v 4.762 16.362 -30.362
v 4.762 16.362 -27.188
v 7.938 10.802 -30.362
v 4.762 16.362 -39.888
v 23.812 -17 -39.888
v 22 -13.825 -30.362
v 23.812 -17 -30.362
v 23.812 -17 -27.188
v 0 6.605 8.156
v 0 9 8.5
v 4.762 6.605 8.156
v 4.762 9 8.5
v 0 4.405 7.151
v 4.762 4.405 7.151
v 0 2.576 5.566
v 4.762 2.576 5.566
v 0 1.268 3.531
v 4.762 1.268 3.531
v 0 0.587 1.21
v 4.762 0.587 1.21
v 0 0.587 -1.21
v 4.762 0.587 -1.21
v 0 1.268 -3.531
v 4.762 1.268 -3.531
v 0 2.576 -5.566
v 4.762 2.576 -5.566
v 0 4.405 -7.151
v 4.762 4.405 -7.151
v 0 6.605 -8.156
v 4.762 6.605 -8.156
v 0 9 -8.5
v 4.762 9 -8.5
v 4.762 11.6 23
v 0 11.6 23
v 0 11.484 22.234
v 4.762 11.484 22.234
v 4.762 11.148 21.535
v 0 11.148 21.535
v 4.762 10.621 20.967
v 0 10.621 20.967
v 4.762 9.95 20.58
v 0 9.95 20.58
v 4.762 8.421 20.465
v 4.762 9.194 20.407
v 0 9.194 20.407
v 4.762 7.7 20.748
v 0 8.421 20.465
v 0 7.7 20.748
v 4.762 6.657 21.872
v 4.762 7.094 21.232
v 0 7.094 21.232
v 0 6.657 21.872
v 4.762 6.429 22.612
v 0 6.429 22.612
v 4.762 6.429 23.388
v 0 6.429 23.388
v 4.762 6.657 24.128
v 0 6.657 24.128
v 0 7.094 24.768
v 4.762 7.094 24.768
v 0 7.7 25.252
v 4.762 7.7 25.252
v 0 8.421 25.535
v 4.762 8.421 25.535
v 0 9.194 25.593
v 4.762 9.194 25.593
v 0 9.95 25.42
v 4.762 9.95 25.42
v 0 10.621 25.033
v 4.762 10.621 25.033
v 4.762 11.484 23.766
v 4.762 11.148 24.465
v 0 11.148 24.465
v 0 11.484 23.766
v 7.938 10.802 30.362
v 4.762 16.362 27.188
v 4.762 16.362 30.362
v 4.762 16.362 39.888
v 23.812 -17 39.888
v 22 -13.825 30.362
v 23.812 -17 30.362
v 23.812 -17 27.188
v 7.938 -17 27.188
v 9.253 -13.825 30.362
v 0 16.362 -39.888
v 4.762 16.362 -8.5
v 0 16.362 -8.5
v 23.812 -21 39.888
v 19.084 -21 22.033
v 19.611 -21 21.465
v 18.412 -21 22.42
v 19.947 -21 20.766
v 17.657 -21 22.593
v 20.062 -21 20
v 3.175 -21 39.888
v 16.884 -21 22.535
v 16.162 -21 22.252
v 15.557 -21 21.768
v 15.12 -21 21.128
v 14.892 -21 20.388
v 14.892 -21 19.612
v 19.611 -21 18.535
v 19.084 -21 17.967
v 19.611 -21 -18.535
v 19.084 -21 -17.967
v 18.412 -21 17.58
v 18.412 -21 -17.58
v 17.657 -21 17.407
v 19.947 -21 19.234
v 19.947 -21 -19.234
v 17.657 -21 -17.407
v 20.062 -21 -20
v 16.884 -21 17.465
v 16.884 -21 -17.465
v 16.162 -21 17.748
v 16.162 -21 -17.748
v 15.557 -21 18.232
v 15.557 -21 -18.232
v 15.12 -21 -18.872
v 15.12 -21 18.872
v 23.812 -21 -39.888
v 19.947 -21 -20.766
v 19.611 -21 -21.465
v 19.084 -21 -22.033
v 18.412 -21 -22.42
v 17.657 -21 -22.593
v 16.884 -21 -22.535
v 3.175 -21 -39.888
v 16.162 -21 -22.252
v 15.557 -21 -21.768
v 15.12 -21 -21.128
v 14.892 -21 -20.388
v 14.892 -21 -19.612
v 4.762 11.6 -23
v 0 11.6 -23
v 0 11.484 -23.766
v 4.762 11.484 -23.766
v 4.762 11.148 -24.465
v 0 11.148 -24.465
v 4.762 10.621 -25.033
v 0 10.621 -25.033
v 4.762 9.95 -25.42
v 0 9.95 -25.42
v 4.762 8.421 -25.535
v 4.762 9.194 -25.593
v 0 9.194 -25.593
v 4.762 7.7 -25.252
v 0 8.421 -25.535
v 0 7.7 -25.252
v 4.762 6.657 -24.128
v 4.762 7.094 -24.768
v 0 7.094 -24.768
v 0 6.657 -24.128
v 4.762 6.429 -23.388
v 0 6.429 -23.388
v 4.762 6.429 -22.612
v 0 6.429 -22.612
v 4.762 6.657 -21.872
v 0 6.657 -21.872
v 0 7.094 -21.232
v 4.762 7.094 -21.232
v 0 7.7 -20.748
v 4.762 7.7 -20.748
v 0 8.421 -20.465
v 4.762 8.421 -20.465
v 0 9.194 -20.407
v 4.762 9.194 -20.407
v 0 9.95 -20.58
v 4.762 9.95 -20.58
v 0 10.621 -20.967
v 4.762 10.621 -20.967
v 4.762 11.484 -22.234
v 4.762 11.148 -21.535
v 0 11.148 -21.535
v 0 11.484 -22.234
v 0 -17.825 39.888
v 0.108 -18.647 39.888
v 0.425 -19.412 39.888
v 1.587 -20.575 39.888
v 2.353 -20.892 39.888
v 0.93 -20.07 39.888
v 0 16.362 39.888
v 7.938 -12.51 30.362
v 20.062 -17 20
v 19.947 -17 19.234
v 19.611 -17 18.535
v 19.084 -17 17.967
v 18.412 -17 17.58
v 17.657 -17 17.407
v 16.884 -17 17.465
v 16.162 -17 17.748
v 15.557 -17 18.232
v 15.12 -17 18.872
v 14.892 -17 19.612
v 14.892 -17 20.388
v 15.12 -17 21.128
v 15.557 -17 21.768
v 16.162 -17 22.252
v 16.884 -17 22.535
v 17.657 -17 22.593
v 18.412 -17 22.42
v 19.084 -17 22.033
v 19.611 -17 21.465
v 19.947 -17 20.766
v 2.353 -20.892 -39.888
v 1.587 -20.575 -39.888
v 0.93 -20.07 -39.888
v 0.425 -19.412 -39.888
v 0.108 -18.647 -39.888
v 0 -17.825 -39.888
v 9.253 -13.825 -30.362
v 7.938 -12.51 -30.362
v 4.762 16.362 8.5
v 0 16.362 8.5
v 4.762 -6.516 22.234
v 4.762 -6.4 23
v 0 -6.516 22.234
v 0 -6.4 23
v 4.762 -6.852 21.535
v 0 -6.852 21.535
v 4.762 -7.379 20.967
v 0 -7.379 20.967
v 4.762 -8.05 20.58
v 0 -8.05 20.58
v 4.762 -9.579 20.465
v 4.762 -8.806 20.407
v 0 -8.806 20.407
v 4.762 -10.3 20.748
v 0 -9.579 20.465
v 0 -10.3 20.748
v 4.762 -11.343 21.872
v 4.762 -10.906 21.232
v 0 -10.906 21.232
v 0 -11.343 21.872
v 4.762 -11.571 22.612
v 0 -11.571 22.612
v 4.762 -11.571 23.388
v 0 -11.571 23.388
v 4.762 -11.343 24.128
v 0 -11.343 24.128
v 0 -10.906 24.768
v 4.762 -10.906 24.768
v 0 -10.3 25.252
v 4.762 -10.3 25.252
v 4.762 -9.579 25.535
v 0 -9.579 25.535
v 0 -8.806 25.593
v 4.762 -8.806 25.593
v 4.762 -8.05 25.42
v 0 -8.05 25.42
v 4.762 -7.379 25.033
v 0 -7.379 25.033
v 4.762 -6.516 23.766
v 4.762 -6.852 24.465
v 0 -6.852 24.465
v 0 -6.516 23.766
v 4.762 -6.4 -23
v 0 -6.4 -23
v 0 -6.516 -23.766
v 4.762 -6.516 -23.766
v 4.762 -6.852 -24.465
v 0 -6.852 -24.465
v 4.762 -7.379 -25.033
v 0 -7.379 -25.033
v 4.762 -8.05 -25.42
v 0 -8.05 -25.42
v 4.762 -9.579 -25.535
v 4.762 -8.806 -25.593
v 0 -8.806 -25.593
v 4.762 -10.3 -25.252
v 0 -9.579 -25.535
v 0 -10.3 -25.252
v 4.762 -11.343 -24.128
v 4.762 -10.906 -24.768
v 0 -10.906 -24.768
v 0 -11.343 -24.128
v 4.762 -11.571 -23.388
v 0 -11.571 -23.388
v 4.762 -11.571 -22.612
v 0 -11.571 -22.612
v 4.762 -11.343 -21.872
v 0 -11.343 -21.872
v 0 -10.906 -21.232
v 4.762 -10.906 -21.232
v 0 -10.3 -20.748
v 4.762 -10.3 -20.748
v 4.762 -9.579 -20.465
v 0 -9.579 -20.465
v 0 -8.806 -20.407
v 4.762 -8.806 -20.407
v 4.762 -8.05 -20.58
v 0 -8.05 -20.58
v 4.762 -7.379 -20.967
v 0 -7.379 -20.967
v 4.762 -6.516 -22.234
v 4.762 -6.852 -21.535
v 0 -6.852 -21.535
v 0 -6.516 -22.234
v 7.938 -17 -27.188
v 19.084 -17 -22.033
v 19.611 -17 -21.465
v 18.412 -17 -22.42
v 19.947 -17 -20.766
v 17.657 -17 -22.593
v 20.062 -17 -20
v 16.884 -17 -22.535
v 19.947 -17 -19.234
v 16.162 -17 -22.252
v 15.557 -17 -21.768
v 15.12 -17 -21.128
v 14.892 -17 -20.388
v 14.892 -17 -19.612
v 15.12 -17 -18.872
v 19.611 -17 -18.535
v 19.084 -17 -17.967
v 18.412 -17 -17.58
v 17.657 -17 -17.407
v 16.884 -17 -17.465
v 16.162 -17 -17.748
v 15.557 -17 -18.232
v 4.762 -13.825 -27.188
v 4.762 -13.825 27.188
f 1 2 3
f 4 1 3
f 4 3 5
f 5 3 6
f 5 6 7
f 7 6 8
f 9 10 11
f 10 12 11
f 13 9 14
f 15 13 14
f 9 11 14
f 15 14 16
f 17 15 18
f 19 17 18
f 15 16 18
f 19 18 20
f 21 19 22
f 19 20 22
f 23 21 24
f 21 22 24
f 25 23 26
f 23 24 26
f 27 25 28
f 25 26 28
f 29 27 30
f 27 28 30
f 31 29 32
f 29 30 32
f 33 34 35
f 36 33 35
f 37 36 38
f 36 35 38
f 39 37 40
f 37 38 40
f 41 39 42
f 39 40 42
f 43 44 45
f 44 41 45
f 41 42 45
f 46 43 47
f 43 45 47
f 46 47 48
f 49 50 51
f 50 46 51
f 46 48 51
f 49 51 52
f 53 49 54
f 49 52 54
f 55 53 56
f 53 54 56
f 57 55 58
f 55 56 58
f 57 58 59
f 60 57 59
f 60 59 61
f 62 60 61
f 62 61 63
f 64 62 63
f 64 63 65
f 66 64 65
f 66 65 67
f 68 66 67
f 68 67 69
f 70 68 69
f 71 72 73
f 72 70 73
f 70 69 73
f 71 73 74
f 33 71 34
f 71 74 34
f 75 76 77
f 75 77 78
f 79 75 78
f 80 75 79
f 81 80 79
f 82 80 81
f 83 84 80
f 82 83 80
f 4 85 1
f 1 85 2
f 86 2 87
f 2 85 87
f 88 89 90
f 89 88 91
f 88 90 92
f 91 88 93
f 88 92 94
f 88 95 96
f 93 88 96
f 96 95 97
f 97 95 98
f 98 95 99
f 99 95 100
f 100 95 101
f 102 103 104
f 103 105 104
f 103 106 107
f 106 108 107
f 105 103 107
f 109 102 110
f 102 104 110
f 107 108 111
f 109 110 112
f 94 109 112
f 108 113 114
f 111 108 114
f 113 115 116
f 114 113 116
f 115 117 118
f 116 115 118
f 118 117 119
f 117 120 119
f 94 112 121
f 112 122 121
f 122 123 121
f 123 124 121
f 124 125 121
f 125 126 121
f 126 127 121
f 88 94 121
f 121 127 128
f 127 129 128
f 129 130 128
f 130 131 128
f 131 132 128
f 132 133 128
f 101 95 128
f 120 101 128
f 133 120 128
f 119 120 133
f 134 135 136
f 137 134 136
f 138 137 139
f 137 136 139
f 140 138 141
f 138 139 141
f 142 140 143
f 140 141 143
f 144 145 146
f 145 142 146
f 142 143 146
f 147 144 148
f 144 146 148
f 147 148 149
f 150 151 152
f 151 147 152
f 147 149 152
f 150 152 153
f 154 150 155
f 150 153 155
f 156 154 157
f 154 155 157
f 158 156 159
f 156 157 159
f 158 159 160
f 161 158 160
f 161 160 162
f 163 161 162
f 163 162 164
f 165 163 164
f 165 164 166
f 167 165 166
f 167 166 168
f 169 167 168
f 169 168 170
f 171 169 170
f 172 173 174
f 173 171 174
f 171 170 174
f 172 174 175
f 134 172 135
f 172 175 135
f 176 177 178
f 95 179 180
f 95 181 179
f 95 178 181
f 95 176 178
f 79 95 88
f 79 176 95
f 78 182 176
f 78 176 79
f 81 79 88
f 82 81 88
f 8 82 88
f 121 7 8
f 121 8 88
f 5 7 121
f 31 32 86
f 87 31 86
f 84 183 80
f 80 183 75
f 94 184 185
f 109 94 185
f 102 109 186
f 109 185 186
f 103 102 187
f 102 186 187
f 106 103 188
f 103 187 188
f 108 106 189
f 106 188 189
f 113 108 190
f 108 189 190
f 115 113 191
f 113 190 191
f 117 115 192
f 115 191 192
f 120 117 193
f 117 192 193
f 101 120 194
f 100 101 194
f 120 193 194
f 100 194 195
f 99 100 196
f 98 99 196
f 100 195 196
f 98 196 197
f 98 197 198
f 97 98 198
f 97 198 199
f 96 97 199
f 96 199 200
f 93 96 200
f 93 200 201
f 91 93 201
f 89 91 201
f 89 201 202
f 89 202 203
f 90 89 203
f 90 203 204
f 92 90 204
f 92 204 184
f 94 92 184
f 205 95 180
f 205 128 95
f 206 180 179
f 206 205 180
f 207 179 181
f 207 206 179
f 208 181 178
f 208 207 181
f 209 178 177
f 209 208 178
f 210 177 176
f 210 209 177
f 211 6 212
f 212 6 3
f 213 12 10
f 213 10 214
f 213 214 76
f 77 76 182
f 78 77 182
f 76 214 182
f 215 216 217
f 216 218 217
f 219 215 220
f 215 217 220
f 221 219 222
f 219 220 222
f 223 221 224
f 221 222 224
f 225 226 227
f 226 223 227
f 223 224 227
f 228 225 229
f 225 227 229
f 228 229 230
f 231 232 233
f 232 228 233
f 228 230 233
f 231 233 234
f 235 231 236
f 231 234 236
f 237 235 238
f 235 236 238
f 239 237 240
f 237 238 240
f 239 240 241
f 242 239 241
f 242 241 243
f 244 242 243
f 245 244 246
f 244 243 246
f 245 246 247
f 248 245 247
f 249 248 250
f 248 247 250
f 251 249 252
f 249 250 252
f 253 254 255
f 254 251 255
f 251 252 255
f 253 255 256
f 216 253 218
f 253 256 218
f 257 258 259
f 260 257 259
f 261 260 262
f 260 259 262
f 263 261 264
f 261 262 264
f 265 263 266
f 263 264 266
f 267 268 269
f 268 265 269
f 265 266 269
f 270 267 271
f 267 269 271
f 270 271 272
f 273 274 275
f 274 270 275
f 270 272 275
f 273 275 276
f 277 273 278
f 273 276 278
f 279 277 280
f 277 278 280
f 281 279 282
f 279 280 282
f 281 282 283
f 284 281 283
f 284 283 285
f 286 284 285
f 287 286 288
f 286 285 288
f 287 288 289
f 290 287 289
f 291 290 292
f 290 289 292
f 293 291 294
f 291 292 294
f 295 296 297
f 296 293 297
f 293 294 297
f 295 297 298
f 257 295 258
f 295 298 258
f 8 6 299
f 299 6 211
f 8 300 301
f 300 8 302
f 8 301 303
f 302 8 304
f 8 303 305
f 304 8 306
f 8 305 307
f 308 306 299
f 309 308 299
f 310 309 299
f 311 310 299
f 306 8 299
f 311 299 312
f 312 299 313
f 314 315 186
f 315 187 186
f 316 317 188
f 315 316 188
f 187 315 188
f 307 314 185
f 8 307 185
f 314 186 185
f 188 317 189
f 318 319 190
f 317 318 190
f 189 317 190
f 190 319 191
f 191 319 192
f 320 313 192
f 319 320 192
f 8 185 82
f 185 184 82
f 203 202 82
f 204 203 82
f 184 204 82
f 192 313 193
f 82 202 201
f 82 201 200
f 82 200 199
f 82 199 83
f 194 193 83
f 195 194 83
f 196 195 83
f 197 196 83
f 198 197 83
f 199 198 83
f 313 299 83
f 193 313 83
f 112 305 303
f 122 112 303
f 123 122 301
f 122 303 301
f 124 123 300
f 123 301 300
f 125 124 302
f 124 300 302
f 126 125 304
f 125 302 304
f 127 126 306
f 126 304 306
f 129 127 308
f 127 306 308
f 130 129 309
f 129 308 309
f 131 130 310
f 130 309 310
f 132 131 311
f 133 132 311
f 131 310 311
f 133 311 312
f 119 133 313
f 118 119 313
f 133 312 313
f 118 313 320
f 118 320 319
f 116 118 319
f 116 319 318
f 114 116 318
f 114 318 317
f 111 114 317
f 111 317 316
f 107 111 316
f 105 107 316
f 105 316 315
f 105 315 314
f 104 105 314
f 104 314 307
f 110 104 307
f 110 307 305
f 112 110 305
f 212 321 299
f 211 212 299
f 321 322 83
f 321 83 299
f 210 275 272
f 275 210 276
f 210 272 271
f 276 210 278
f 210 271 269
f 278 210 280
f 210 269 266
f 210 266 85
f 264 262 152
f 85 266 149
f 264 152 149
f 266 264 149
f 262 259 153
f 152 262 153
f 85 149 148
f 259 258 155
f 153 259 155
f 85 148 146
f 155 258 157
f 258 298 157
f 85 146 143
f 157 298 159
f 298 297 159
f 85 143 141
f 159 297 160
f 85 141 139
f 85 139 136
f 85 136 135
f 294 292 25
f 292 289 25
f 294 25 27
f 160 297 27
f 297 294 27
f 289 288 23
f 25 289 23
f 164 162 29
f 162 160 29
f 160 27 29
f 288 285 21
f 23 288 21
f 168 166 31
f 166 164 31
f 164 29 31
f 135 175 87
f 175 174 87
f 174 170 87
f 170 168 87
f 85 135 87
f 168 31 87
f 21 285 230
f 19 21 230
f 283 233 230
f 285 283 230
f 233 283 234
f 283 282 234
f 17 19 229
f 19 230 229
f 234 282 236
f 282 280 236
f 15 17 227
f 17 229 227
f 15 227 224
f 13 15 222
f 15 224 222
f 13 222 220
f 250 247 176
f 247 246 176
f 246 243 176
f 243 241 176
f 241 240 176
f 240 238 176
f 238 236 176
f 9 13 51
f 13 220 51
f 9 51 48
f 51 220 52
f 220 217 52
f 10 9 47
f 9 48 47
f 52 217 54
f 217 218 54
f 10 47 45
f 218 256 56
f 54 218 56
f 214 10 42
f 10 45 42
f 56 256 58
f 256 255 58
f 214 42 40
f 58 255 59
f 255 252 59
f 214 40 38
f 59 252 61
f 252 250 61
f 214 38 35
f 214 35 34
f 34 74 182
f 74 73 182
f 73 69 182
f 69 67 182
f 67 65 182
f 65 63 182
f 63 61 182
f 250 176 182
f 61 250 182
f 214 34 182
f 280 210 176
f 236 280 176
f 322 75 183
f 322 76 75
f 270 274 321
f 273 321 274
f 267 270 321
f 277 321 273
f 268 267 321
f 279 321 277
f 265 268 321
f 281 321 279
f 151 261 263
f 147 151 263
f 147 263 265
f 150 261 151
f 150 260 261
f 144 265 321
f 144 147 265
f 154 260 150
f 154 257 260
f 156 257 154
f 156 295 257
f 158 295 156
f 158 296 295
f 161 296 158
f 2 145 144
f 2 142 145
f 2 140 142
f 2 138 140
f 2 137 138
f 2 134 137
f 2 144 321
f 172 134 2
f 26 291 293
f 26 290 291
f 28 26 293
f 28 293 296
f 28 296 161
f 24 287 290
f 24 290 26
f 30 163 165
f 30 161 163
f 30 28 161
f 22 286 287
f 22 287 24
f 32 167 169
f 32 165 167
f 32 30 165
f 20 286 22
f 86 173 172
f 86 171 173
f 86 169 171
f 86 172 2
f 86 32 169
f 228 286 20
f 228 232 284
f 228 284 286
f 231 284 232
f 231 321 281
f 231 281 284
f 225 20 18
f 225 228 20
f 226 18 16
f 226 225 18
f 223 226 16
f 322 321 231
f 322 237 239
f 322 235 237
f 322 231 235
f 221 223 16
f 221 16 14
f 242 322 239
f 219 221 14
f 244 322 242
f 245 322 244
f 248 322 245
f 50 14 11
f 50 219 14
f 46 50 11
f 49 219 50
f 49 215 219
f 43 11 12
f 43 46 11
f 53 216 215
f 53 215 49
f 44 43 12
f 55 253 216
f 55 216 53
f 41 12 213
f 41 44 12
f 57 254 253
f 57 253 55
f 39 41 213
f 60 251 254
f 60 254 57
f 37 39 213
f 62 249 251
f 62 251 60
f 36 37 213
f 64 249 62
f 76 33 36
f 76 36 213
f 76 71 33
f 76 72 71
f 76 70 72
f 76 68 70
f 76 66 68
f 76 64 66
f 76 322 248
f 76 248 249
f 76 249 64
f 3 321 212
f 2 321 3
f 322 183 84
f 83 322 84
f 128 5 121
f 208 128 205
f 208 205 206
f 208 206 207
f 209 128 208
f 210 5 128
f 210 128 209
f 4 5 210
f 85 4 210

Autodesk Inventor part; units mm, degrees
ref_plane "YZ Plane" through (0, 0, 0) normal (1, 0, 0) x (0, 1, 0)
ref_plane "XZ Plane" through (0, 0, 0) normal (0, 1, 0) x (-1, 0, 0)
ref_plane "XY Plane" through (0, 0, 0) normal (0, 0, 1) x (1, 0, 0)
sketch "Sketch1" plane through (0, 0, 0) normal (1, 0, 0) x (0, 1, 0)
  line L0 (-9, -23) -> (9, -23) construction
  line L1 (9, -23) -> (9, 23) construction
  line L2 (9, 23) -> (-9, 23) construction
  line L3 (-9, 23) -> (-9, -23) construction
  line L4 (-9, -23) -> (9, 23) construction
  line L5 (9, -23) -> (-9, 23) construction
  circle A0 centre (9, 23) radius 2.6
  circle A1 centre (9, -23) radius 2.6
  circle A2 centre (-9, -23) radius 2.6
  circle A3 centre (-9, 23) radius 2.6
  circle A4 centre (9, 23) radius 7.3625 construction
  circle A5 centre (9, -23) radius 7.3625 construction
  circle A6 centre (-9, -23) radius 7.3625 construction
  circle A7 centre (-9, 23) radius 7.3625 construction
  line L6 (16.3625, 30.3625) -> (-21, 30.3625)
  line L7 (-21, 30.3625) -> (-21, -30.3625)
  line L8 (-21, -30.3625) -> (16.3625, -30.3625)
  line L9 (16.3625, -30.3625) -> (16.3625, 30.3625)
  point P0 (0, 0)
  dimension "d0" = 5.2
  dimension "d1" = 46
  dimension "d2" = 18
  dimension "d3" = 4.7625
  dimension "d7" = 12
extrude "Extrusion1" add sketch "Sketch1" along normal blind 4.7625
sketch "Sketch4" plane through (4.7625, 0, 0) normal (1, 0, 0) x (0, 0, -1)
  arc A0 (-8.5, 9) -> (8.5, 9) centre (0, 9) ccw
  circle A1 centre (-23, 9) radius 2.6 projected
  line L0 (8.5, 9) -> (8.5, 16.3625)
  line L1 (30.3625, 16.3625) -> (-30.3625, 16.3625) projected
  line L2 (-8.5, 9) -> (-8.5, 16.3625)
  point P0 (0, 0)
  point P1 (27.1875, 16.3625)
  point P2 (-27.1875, 16.3625)
  dimension "d21" = 17
extrude "Extrusion5" cut sketch "Sketch4" against normal through all contours L2 L1 L0 A0
sketch "Sketch5" plane through (4.7625, 0, 0) normal (1, 0, 0) x (0, 0, -1)
  line L0 (30.3625, 16.3625) -> (8.5, 16.3625) projected
  line L1 (-30.3625, 16.3625) -> (-30.3625, -21) projected
  line L2 (-30.3625, -21) -> (30.3625, -21) projected
  line L3 (30.3625, -21) -> (30.3625, 16.3625) projected
  line L4 (-8.5, 16.3625) -> (-30.3625, 16.3625) projected
  line L5 (8.5, 16.3625) -> (8.5, 9) projected
  arc A0 (-8.5, 9) -> (8.5, 9) centre (0, 9) ccw projected
  line L6 (-8.5, 9) -> (-8.5, 16.3625) projected
  circle A1 centre (-23, -9) radius 2.6 projected
  circle A2 centre (23, -9) radius 2.6 projected
  circle A3 centre (23, 9) radius 2.6 projected
  circle A4 centre (-23, 9) radius 2.6 projected
  line L7 (30.3625, -21) -> (30.3625, 13.1875) projected
  line L8 (-30.3625, -21) -> (30.3625, -21)
  line L9 (30.3625, -21) -> (30.3625, -17)
  line L10 (30.3625, -17) -> (-30.3625, -17)
  line L11 (-30.3625, -17) -> (-30.3625, -21)
  point P0 (0, 0)
  point P1 (30.3625, -17.825)
  point P2 (30.3625, -17)
  point P3 (-30.3625, -17)
  dimension "d29" = 4
extrude "Extrusion6" add sketch "Sketch5" along normal blind 19.05 contours L3 L2 L1 L10
sketch "Sketch6" plane through (4.7625, -17, 30.3625) normal (0, 1, 0) x (1, 0, 0)
  circle A0 centre (12.7, 10.3625) radius 2.6
  circle A1 centre (12.7, 50.3625) radius 2.6
  line L0 (0, 9.9625) -> (0, 4.7625) projected
  line L1 (0, 0) -> (0, 60.725) projected
  line L2 (19.05, 60.725) -> (19.05, 0) projected
  point P0 (-4.7625, 30.3625)
  point P1 (19.05, 30.3625)
  point P2 (19.05, 30.3625)
  dimension "d32" = 5.2
  dimension "d34" = 20
  dimension "d35" = 20
  dimension "d40" = 6.35
extrude "Extrusion7" cut sketch "Sketch6" against normal through all
sketch "Sketch12" plane through (0, -21, -30.3625) normal (0, 0, -1) x (-1, 0, 0)
  line L0 (0, 0) -> (0, 37.3625) projected
  line L1 (0, 37.3625) -> (-4.7625, 37.3625) projected
  line L2 (-4.7625, 4) -> (-4.7625, 37.3625) projected
  line L3 (-4.7625, 4) -> (-23.8125, 4) projected
  line L4 (-23.8125, 0) -> (-23.8125, 4) projected
  line L5 (0, 0) -> (-23.8125, 0) projected
  line L6 (-23.8125, 0) -> (-23.8125, 4) projected
  line L7 (-4.7625, 37.3625) -> (-23.8125, 4)
  point P0 (0, 21)
extrude "Extrusion13" add sketch "Sketch12" along normal blind 9.525
sketch "Sketch13" plane through (0, -21, 30.3625) normal (0, 0, 1) x (1, 0, 0)
  line L0 (4.7625, 4) -> (23.8125, 4) projected
  line L1 (4.7625, 37.3625) -> (23.8125, 4) projected
  line L2 (4.7625, 4) -> (4.7625, 37.3625) projected
  line L3 (0, 37.3625) -> (0, 0) projected
  line L4 (0, 0) -> (23.8125, 0) projected
  line L5 (23.8125, 4) -> (23.8125, 0) projected
  line L6 (4.7625, 4) -> (23.8125, 4) projected
  line L7 (4.7625, 37.3625) -> (4.7625, 4) projected
  line L8 (0, 37.3625) -> (4.7625, 37.3625) projected
  point P0 (0, 21)
  point P1 (23.8125, 4)
  point P2 (4.7625, 37.3625)
extrude "Extrusion14" add sketch "Sketch13" along normal blind 9.525
chamfer "Chamfer1" distance 3.175 angle 45 1 edges at (4.7625, -17, 0)
chamfer "Chamfer2" distance 3.175 angle 45 6 edges at (15.875, -17, 30.3625) (6.35, -15.4125, 30.3625) (4.7625, 1.2687, 30.3625) (4.7625, 1.2688, -30.3625) (6.35, -15.4125, -30.3625) (15.875, -17, -30.3625)
fillet "Fillet9" radius 3.175 1 edges at (0, -21, 0)
equation "\"d35\" = d34"
properties part number "CNC-022-XAxisBallScrewStabilizerMount" material "ABS Plastic"
